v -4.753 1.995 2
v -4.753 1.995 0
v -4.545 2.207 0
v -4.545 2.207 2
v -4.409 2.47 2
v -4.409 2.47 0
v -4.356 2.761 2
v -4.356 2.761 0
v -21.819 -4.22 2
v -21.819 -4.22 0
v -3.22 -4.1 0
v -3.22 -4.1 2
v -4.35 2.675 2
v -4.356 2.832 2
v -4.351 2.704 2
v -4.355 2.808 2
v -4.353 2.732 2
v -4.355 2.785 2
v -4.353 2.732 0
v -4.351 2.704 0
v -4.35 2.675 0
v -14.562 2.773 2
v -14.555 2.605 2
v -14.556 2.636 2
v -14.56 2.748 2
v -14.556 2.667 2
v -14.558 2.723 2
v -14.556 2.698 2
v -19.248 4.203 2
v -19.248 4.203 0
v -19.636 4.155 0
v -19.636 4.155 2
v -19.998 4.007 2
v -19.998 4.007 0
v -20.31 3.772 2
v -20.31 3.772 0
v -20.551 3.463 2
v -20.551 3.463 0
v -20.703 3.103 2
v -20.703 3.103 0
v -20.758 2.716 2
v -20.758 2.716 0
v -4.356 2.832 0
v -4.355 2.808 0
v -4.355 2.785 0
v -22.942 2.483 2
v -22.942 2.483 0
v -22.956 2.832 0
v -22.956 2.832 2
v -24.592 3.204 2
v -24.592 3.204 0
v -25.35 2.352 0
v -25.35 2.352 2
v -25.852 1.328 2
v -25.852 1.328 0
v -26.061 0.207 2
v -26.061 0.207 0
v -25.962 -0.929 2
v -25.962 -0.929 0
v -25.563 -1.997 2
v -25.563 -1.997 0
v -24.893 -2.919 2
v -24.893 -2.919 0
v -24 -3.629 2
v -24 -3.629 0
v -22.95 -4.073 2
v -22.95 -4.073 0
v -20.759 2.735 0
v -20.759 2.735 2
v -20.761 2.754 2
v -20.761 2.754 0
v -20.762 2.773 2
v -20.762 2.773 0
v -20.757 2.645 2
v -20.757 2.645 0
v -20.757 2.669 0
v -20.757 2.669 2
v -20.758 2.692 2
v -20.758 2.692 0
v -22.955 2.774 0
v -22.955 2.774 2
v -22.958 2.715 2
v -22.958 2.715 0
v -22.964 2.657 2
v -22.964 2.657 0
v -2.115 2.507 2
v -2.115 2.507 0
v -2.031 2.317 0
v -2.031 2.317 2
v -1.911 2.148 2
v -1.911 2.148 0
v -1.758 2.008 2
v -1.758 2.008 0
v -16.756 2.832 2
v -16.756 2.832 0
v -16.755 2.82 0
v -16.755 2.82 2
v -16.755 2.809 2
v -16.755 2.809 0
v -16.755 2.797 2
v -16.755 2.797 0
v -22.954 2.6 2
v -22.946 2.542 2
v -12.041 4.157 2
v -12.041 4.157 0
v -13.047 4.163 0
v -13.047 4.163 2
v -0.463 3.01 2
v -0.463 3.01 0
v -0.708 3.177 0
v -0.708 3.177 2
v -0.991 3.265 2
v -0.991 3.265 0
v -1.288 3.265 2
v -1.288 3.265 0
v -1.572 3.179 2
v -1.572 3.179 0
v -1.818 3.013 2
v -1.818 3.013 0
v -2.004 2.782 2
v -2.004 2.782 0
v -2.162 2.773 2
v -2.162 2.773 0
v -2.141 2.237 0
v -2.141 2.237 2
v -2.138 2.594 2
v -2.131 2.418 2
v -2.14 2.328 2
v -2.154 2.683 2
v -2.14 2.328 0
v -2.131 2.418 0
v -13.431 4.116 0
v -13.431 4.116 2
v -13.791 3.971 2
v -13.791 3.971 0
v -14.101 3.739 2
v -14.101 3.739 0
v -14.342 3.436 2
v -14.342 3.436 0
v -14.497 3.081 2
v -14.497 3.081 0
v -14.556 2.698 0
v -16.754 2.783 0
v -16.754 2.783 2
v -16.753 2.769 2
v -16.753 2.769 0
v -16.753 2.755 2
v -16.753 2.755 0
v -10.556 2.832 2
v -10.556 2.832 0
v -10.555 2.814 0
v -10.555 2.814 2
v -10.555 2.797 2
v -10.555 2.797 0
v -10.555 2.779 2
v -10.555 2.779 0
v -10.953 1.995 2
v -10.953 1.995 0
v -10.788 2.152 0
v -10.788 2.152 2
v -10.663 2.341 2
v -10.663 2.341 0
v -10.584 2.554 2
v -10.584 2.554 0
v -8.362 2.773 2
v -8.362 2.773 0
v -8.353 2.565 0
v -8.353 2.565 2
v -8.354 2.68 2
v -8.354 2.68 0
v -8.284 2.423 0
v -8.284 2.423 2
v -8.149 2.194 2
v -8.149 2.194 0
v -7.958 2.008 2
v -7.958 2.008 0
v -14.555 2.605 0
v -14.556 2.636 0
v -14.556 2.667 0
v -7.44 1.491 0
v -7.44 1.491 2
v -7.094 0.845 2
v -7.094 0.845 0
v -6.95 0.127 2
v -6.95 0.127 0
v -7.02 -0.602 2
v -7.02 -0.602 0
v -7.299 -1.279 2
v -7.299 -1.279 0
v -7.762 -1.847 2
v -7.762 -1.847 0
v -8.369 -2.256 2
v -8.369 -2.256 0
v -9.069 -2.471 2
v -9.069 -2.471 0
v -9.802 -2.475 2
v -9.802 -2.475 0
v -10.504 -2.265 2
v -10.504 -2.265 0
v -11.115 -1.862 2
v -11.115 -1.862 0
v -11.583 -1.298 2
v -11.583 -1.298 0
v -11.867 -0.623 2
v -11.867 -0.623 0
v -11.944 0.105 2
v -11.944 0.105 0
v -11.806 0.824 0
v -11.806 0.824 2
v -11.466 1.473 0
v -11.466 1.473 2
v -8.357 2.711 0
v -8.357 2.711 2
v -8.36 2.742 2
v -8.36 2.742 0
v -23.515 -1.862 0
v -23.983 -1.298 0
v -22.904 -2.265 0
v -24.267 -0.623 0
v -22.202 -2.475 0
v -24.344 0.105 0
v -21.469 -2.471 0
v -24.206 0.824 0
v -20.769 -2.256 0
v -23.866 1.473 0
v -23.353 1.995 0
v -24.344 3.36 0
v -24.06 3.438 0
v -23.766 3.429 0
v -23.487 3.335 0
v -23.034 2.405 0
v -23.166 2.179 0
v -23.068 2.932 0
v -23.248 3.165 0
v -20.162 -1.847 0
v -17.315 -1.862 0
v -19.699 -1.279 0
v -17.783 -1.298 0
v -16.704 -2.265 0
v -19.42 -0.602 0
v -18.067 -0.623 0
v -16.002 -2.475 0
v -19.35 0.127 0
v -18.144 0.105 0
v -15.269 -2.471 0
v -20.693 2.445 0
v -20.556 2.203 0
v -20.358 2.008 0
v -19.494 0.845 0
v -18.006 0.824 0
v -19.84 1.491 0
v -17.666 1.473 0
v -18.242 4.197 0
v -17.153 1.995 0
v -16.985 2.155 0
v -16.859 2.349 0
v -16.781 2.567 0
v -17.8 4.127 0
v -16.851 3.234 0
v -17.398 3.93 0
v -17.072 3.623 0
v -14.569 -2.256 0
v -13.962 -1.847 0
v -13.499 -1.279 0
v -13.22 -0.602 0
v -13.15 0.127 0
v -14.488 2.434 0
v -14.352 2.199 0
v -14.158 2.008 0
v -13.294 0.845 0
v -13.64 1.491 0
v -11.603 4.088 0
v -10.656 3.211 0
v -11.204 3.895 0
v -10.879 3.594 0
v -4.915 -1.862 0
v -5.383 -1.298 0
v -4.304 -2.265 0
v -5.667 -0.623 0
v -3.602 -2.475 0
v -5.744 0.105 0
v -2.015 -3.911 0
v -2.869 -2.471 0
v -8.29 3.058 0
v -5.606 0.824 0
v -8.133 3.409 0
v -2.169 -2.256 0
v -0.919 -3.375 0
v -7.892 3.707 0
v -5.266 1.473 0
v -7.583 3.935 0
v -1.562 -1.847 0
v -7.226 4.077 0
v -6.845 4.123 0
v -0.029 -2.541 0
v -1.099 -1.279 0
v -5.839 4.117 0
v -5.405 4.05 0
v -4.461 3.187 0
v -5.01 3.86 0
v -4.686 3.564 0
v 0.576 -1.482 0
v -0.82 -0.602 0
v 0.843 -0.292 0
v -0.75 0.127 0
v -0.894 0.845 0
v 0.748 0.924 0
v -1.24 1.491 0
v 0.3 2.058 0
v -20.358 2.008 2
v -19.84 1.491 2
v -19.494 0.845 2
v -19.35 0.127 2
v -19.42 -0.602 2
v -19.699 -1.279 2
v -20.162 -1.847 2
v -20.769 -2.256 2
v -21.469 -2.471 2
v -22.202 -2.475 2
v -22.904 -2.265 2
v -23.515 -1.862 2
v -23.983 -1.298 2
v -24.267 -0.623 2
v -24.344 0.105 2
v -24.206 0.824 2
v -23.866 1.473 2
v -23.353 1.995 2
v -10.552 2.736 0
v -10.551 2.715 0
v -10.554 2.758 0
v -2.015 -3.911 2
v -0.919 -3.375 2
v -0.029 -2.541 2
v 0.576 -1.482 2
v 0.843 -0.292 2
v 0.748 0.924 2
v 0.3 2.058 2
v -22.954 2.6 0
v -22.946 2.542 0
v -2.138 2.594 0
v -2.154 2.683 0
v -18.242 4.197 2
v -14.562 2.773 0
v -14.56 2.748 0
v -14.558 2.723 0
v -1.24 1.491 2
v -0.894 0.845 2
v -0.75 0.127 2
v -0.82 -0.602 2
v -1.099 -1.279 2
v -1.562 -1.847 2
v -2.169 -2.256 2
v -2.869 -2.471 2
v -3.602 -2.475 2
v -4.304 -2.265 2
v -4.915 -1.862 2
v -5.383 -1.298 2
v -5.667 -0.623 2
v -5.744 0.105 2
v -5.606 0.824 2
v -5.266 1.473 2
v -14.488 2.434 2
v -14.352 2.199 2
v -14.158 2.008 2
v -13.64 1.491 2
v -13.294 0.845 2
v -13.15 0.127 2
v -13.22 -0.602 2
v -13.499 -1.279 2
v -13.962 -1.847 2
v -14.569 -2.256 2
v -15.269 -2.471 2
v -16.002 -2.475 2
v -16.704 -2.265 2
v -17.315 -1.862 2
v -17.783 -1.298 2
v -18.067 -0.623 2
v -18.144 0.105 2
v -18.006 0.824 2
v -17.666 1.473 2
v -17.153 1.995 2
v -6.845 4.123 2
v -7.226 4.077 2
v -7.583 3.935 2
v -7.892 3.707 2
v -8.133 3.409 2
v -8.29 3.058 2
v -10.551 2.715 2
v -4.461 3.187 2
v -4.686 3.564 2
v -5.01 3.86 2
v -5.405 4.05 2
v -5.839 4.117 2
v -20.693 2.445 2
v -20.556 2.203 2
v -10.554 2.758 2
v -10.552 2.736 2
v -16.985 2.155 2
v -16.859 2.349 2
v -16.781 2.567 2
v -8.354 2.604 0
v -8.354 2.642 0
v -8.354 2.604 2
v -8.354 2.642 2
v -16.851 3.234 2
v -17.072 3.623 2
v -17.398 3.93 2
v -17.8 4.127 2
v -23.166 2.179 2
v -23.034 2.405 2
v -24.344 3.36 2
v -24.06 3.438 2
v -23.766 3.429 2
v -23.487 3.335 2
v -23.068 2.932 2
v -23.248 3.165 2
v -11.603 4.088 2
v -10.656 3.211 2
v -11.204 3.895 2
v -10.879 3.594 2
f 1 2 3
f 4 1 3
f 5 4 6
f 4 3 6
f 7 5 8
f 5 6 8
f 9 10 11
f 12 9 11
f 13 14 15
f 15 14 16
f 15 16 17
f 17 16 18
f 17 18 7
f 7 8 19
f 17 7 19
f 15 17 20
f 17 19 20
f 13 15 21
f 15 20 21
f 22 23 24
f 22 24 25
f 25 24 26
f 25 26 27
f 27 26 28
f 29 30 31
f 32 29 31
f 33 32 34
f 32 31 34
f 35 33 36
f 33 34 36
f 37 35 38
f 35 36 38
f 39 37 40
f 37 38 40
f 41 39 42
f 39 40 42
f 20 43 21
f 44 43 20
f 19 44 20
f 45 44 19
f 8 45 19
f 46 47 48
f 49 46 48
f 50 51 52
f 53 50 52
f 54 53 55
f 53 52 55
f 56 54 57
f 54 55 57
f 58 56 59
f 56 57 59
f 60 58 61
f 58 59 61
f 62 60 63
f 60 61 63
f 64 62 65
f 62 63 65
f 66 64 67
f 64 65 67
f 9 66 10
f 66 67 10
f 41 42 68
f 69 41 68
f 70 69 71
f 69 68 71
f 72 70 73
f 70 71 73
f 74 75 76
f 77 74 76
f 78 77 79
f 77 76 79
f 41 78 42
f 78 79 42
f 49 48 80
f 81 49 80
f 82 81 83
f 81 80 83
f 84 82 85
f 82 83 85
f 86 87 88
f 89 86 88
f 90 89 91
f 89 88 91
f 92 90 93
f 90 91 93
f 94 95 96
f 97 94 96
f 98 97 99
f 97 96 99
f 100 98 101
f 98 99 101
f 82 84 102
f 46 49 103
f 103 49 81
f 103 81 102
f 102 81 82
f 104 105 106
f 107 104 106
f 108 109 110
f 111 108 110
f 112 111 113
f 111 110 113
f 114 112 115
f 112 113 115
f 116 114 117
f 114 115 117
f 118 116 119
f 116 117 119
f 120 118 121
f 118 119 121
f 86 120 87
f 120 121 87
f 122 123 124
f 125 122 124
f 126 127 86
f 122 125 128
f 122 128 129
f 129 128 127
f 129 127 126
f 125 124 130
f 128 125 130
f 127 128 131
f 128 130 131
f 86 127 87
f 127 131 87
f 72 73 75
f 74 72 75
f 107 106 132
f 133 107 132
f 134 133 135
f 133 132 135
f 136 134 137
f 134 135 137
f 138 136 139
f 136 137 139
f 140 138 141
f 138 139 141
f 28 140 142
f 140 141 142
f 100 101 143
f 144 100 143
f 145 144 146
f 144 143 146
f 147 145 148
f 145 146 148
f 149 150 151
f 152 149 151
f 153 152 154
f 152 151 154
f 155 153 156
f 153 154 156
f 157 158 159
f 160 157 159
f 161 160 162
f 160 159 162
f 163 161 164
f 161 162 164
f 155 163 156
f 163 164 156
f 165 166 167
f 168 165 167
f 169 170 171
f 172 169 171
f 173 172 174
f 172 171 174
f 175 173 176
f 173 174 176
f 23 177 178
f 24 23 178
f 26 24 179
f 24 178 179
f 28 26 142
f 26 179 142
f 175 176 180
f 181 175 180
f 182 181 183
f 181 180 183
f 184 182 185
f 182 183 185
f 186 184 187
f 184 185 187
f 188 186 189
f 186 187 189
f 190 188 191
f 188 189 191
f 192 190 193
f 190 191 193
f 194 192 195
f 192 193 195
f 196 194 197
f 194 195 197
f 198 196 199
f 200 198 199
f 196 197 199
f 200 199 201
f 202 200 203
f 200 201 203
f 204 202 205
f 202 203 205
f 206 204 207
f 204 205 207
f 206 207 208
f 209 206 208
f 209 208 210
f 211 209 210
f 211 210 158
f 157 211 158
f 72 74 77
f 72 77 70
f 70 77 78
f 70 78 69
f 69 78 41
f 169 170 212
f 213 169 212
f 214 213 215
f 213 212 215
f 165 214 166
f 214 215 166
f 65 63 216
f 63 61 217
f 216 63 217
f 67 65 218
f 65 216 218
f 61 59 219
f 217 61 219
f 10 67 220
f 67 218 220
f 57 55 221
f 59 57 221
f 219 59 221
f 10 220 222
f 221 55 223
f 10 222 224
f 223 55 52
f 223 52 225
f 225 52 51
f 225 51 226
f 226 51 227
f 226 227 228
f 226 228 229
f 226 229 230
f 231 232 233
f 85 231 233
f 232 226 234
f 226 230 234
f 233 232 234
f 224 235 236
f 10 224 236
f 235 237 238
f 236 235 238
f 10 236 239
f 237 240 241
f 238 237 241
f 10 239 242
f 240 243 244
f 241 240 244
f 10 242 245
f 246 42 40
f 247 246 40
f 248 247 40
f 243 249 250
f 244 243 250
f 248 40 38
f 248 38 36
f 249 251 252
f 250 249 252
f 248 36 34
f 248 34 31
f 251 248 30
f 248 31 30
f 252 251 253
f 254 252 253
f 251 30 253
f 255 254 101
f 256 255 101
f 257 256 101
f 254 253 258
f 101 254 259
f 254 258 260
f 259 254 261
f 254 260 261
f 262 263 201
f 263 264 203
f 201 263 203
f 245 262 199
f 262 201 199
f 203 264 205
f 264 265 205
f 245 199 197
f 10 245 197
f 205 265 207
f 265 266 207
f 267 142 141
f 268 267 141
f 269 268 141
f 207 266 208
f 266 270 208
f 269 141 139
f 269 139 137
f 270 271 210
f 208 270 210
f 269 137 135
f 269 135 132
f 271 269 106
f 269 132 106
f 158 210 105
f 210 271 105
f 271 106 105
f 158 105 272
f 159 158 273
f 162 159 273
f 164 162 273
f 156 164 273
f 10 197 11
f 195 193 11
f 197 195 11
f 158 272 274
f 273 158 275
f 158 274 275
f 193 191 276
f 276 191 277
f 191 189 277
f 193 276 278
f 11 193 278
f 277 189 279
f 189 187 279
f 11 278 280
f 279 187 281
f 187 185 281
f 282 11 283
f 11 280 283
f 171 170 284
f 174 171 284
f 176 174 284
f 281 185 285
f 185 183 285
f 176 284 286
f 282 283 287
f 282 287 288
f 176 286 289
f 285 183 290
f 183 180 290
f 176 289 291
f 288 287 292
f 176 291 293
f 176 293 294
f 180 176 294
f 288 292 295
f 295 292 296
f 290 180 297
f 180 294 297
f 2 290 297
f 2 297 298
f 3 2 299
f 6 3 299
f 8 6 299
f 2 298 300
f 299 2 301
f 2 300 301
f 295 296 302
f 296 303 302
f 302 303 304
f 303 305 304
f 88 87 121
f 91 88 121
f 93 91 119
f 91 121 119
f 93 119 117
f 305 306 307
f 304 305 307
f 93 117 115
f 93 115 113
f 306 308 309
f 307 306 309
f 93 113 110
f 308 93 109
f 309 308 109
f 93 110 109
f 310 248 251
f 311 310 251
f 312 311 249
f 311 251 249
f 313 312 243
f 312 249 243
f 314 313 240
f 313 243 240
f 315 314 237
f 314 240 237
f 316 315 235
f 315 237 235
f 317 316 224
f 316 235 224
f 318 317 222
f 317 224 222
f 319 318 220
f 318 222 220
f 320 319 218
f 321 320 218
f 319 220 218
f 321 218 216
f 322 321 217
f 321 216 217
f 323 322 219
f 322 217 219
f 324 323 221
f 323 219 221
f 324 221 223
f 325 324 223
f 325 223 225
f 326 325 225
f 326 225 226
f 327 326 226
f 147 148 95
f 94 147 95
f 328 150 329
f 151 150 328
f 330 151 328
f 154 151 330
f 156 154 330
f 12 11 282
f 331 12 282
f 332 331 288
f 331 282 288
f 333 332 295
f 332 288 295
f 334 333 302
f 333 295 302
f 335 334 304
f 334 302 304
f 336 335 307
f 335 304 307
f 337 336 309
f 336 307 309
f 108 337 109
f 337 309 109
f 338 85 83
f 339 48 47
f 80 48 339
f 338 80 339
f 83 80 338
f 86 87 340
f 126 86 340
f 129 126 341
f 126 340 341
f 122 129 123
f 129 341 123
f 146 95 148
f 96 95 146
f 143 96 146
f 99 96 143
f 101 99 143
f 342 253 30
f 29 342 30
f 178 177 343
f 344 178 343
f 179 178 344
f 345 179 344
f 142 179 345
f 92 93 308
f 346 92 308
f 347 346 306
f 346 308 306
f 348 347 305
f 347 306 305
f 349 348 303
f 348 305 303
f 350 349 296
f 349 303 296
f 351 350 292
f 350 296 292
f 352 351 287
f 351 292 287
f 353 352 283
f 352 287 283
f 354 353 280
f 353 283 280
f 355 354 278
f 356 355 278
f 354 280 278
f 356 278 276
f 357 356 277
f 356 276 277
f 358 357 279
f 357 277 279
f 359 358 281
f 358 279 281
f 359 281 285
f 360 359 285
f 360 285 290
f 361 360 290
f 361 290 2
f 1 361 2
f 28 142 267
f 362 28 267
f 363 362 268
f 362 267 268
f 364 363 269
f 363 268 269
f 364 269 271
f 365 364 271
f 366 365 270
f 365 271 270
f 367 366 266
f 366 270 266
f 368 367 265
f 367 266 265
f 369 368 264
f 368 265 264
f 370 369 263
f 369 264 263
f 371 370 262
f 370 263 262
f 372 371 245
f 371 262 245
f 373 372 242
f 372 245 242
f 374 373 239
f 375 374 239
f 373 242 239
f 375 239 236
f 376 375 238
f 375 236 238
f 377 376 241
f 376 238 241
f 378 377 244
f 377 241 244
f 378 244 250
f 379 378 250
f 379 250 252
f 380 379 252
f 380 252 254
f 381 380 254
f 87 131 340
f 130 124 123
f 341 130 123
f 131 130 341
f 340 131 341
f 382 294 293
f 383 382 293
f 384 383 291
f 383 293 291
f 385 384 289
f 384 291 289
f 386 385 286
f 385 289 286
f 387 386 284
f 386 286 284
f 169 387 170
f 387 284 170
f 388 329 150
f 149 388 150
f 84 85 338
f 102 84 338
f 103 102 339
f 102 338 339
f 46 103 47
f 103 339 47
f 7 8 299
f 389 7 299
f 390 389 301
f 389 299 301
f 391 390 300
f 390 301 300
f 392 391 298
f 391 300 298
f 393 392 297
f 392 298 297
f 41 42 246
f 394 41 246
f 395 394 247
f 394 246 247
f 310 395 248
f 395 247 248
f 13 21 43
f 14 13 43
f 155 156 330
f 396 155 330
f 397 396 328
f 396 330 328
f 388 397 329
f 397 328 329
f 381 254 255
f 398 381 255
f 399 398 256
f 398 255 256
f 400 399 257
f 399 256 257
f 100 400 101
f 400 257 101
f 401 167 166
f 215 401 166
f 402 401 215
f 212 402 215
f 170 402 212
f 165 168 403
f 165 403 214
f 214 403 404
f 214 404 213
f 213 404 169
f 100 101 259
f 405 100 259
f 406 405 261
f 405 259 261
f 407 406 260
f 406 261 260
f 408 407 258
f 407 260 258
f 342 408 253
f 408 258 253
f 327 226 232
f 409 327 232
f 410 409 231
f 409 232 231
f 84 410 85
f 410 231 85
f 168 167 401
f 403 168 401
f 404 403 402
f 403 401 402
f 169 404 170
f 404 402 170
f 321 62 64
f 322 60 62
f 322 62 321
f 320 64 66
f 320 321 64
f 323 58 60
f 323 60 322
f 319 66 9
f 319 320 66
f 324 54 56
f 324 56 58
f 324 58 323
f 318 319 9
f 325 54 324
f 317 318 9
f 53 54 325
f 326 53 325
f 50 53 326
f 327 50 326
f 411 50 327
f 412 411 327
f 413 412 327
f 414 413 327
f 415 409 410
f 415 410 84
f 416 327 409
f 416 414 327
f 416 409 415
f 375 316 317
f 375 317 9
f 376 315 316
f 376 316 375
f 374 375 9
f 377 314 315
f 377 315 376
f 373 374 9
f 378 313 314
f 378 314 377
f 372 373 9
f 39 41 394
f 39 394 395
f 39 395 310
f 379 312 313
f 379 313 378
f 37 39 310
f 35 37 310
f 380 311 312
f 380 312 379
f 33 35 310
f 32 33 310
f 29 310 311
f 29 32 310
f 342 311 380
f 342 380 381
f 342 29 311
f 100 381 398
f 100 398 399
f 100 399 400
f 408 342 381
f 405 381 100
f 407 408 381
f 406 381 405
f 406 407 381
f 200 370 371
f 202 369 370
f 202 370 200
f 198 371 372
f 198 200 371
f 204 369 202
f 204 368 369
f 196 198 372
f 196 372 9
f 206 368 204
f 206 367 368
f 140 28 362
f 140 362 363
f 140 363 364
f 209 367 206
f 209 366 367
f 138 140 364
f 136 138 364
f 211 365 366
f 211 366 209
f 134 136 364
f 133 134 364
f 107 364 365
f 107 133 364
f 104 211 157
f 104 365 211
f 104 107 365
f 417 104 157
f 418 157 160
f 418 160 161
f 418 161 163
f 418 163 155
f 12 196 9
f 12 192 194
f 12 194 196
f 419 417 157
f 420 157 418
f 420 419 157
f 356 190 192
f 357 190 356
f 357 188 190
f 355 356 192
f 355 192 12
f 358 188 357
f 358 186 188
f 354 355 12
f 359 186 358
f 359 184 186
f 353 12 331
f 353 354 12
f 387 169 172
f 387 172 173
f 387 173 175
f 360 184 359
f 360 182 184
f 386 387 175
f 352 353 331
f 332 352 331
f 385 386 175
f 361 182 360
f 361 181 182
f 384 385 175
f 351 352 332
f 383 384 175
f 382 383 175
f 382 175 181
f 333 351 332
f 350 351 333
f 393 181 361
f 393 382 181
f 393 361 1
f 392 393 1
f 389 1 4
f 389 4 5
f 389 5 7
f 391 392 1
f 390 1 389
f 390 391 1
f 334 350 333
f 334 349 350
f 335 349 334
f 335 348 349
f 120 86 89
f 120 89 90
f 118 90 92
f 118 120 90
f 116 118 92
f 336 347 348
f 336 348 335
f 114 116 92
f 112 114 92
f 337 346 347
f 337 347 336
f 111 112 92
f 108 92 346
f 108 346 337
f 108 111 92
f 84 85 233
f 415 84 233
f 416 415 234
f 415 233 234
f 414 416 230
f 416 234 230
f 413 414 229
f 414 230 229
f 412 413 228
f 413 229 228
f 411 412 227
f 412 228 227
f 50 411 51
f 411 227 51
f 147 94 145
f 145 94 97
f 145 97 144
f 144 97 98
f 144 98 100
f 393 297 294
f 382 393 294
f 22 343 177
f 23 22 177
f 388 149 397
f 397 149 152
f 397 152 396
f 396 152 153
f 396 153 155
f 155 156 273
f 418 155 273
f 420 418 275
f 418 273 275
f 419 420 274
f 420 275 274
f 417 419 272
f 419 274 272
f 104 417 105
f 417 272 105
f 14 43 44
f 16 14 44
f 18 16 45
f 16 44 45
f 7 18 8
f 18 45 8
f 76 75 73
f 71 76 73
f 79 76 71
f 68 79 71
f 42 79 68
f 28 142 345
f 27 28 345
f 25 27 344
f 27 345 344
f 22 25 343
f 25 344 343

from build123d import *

# Parameters (mm, degrees)
F1_DEPTH = 2


with BuildPart() as f1:
    # F0 (on Top) → F1 (new body)
    with BuildSketch(Plane.XY):
        with BuildLine():
            ThreePointArc((-20.7565734159, 2.6450559883), (-20.7575227142, 2.6803675531), (-20.7576402354, 2.7156916802))
            ThreePointArc((-20.7576402354, 2.7156916802), (-20.7600003801, 2.7444381453), (-20.7615304896, 2.7732407199))
            Line((-20.7615304896, 2.7732407199), (-20.7565734159, 2.6450559883))
        make_face()
    extrude(amount=F1_DEPTH)


with BuildPart() as f1b:
    # F0 (on Top) → F1, piece 2 (new body)
    with BuildSketch(Plane.XY):
        with BuildLine():
            ThreePointArc((-16.7558578866, 2.8320419808), (-16.7553359551, 2.8146099746), (-16.7551181024, 2.7971715173))
            ThreePointArc((-16.7551181024, 2.7971715173), (-16.7538370868, 2.7758509096), (-16.7528597854, 2.7545142229))
            Line((-16.7528597854, 2.7545142229), (-16.7558578866, 2.8320419808))
        make_face()
    extrude(amount=F1_DEPTH)


with BuildPart() as f1c:
    # F0 (on Top) → F1, piece 3 (new body)
    with BuildSketch(Plane.XY):
        with BuildLine():
            ThreePointArc((-14.5550311684, 2.6051750824), (-14.5561062892, 2.6514906978), (-14.5557505918, 2.6978174244))
            ThreePointArc((-14.5557505918, 2.6978174244), (-14.559353965, 2.7354744005), (-14.5615304896, 2.7732407199))
            Line((-14.5615304896, 2.7732407199), (-14.5550311684, 2.6051750824))
        make_face()
    extrude(amount=F1_DEPTH)


with BuildPart() as f1d:
    # F0 (on Top) → F1, piece 4 (new body)
    with BuildSketch(Plane.XY):
        with BuildLine():
            ThreePointArc((-10.5558578866, 2.8320419808), (-10.5551858321, 2.8056339835), (-10.5552115594, 2.7792174485))
            ThreePointArc((-10.5552115594, 2.7792174485), (-10.5529162844, 2.7469463809), (-10.5513175378, 2.714633317))
            Line((-10.5513175378, 2.714633317), (-10.5558578866, 2.8320419808))
        make_face()
    extrude(amount=F1_DEPTH)


with BuildPart() as f1e:
    # F0 (on Top) → F1, piece 5 (new body)
    with BuildSketch(Plane.XY):
        with BuildLine():
            ThreePointArc((-8.3534889208, 2.5652941765), (-8.354609135, 2.6226261597), (-8.3535372087, 2.6799590661))
            ThreePointArc((-8.3535372087, 2.6799590661), (-8.3586261172, 2.7265062968), (-8.3615304896, 2.7732407199))
            Line((-8.3615304896, 2.7732407199), (-8.3534889208, 2.5652941765))
        make_face()
    extrude(amount=F1_DEPTH)


with BuildPart() as f1f:
    # F0 (on Top) → F1, piece 6 (new body)
    with BuildSketch(Plane.XY):
        with BuildLine():
            ThreePointArc((-4.3558578866, 2.8320419808), (-4.3551162701, 2.7966496504), (-4.3556278141, 2.761253247))
            ThreePointArc((-4.3556278141, 2.761253247), (-4.3520764632, 2.7180451217), (-4.3497752903, 2.6747524111))
            Line((-4.3497752903, 2.6747524111), (-4.3558578866, 2.8320419808))
        make_face()
    extrude(amount=F1_DEPTH)


with BuildPart() as f1g:
    # F0 (on Top) → F1, piece 7 (new body)
    with BuildSketch(Plane.XY):
        with BuildLine():
            ThreePointArc((-2.1408045699, 2.2372901502), (-2.136841227, 2.3728774013), (-2.1145649399, 2.5066809058))
            ThreePointArc((-2.1145649399, 2.5066809058), (-2.1471079644, 2.6383644747), (-2.1615304896, 2.7732407199))
            Line((-2.1615304896, 2.7732407199), (-2.1408045699, 2.2372901502))
        make_face()
    extrude(amount=F1_DEPTH)


with BuildPart() as f1h:
    # F0 (on Top) → F1, piece 8 (new body)
    with BuildSketch(Plane.XY):
        with BuildLine():
            ThreePointArc((-22.9558578866, 2.8320419808), (-22.9563152593, 2.7443374212), (-22.9644556672, 2.6570102621))
            ThreePointArc((-22.9644556672, 2.6570102621), (-22.9495955417, 2.570572564), (-22.9423663607, 2.4831652536))
            Line((-22.9423663607, 2.4831652536), (-22.9558578866, 2.8320419808))
        make_face()
    extrude(amount=F1_DEPTH)


with BuildPart() as f1i:
    # F0 (on Top) → F1, piece 9 (new body)
    with BuildSketch(Plane.XY):
        with BuildLine():
            ThreePointArc((-20.3577235813, 2.0084879738), (-21.8353182092, -2.499975708), (-23.3526047247, 1.9952853839))
            ThreePointArc((-23.3526047247, 1.9952853839), (-23.0925503167, 2.2874458959), (-22.9644556672, 2.6570102621))
            ThreePointArc((-22.9644556672, 2.6570102621), (-23.6232319071, 3.3924834447), (-24.5924063832, 3.2037832292))
            ThreePointArc((-24.5924063832, 3.2037832292), (-25.7991251808, -1.4766836558), (-21.8192041361, -4.219523242))
            Line((-21.8192041361, -4.219523242), (-3.2199733119, -4.0999152244))
            ThreePointArc((-3.2199733119, -4.0999152244), (0.5762627025, -1.4824694686), (-0.462587727, 3.010104398))
            ThreePointArc((-0.462587727, 3.010104398), (-1.4330563808, 3.232501925), (-2.1145649399, 2.5066809058))
            ThreePointArc((-2.1145649399, 2.5066809058), (-1.9752466284, 2.2295765313), (-1.7577235813, 2.0084879738))
            ThreePointArc((-1.7577235813, 2.0084879738), (-3.2353182092, -2.499975708), (-4.7526047247, 1.9952853839))
            ThreePointArc((-4.7526047247, 1.9952853839), (-4.4672657138, 2.3332574201), (-4.3556278141, 2.761253247))
            ThreePointArc((-4.3556278141, 2.761253247), (-4.8367978682, 3.724103182), (-5.8390089357, 4.1167577305))
            Line((-5.8390089357, 4.1167577305), (-6.8449632607, 4.1232268261))
            ThreePointArc((-6.8449632607, 4.1232268261), (-7.8915497803, 3.7071187063), (-8.3535372087, 2.6799590661))
            ThreePointArc((-8.3535372087, 2.6799590661), (-8.2237455247, 2.3040715359), (-7.9577235813, 2.0084879738))
            ThreePointArc((-7.9577235813, 2.0084879738), (-9.4353182092, -2.499975708), (-10.9526047247, 1.9952853839))
            ThreePointArc((-10.9526047247, 1.9952853839), (-10.6631673963, 2.3412528484), (-10.5552115594, 2.7792174485))
            ThreePointArc((-10.5552115594, 2.7792174485), (-11.0302455377, 3.7565326551), (-12.0405511833, 4.1566386364))
            Line((-12.0405511833, 4.1566386364), (-13.0465055083, 4.1631077321))
            ThreePointArc((-13.0465055083, 4.1631077321), (-14.1010242152, 3.7393548233), (-14.5557505918, 2.6978174244))
            ThreePointArc((-14.5557505918, 2.6978174244), (-14.4282796891, 2.3118431509), (-14.1577235813, 2.0084879738))
            ThreePointArc((-14.1577235813, 2.0084879738), (-15.6353182092, -2.499975708), (-17.1526047247, 1.9952853839))
            ThreePointArc((-17.1526047247, 1.9952853839), (-16.8591443462, 2.3492781847), (-16.7551181024, 2.7971715173))
            ThreePointArc((-16.7551181024, 2.7971715173), (-17.2237540049, 3.7889085344), (-18.2420934308, 4.1965195424))
            Line((-18.2420934308, 4.1965195424), (-19.2480477558, 4.202988638))
            ThreePointArc((-19.2480477558, 4.202988638), (-20.3104339633, 3.7715410949), (-20.7576402354, 2.7156916802))
            ThreePointArc((-20.7576402354, 2.7156916802), (-20.6327385426, 2.3196460478), (-20.3577235813, 2.0084879738))
        make_face()
    extrude(amount=F1_DEPTH)


solid = Compound([f1.part, f1b.part, f1c.part, f1d.part, f1e.part, f1f.part, f1g.part, f1h.part, f1i.part])
